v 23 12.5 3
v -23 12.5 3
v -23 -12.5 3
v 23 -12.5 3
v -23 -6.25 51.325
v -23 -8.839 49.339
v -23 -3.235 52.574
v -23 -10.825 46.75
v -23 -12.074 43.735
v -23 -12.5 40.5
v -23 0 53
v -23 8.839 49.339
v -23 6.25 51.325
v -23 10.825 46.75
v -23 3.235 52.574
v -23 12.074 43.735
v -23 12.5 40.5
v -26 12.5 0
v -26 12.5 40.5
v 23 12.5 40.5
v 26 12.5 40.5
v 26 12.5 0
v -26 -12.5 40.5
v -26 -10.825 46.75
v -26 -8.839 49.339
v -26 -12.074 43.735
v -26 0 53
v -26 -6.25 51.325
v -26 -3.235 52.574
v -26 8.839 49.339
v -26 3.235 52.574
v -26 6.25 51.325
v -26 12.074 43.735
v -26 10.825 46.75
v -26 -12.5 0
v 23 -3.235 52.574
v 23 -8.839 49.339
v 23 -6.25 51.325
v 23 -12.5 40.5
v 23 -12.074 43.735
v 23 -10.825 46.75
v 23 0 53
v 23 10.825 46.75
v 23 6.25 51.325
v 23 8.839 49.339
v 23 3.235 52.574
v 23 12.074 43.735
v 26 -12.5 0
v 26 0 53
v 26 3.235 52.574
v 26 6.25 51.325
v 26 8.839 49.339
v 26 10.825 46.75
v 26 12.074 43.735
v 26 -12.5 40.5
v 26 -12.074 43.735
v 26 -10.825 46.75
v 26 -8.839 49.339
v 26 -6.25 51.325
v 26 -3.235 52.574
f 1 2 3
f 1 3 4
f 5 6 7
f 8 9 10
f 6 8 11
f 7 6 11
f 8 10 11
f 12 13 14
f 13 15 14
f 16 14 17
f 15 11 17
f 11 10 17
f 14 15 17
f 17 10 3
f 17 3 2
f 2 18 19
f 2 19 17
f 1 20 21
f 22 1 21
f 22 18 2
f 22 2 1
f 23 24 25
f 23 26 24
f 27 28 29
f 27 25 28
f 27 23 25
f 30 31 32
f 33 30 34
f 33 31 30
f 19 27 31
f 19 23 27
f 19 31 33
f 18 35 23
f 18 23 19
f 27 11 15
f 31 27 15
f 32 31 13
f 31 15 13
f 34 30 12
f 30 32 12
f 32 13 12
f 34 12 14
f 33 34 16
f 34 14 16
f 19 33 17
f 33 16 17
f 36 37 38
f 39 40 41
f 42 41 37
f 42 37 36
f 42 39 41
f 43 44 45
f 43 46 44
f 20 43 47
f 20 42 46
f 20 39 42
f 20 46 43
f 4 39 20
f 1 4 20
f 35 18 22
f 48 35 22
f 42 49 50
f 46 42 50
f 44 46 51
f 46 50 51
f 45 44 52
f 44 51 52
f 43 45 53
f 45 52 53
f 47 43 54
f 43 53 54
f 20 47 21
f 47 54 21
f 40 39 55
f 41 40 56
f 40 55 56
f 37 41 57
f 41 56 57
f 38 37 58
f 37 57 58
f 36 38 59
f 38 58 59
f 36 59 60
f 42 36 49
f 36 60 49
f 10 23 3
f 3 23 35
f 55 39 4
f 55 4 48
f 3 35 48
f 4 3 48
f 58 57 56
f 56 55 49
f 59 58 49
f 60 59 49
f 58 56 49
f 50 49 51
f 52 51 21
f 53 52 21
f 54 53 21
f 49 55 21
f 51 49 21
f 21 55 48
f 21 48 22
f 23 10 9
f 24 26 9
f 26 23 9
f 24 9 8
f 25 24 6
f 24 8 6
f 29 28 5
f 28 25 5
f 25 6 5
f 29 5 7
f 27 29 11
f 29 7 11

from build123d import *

# Parameters (mm, degrees)
SKETCH_1_W          = 52
SKETCH_1_H          = 25
EXTRUDE_1_DEPTH     = 3
SKETCH_2_W          = 3
SKETCH_2_H          = 25
EXTRUDE_2_DEPTH     = 50
CUT_EXTRUDE_1_DEPTH = 76.294422104


with BuildPart() as part:
    # 스케치1 → 보스-돌출1 (new body)
    with BuildSketch(Plane.XY):
        Rectangle(SKETCH_1_W, SKETCH_1_H)
    extrude(amount=EXTRUDE_1_DEPTH)

    # 스케치2 → 보스-돌출2 (add)
    with BuildSketch(Plane.XY.offset(3)):
        with Locations((-24.5, 0)):
            Rectangle(SKETCH_2_W, SKETCH_2_H)
        with Locations((24.5, 0)):
            Rectangle(SKETCH_2_W, SKETCH_2_H)
    extrude(amount=EXTRUDE_2_DEPTH)

    # 스케치3 → 컷-돌출1 (cut, through all)
    with BuildSketch(Plane(origin=(26, 0, 0), x_dir=(0, 0, -1), z_dir=(1, 0, 0))):
        with BuildLine():
            ThreePointArc((-53, 1.56e-07), (-49.33883471, 8.83883482), (-40.5, 12.5))
            Line((-40.5, 12.5), (-53, 12.5))
            Line((-53, 12.5), (-53, 1.56e-07))
        make_face()
        with BuildLine():
            Line((-53, -12.5), (-40.5, -12.5))
            ThreePointArc((-40.5, -12.5), (-49.33883482, -8.83883471), (-53, 1.56e-07))
            Line((-53, 1.56e-07), (-53, -12.5))
        make_face()
    extrude(amount=-CUT_EXTRUDE_1_DEPTH, mode=Mode.SUBTRACT)


solid = part.part
